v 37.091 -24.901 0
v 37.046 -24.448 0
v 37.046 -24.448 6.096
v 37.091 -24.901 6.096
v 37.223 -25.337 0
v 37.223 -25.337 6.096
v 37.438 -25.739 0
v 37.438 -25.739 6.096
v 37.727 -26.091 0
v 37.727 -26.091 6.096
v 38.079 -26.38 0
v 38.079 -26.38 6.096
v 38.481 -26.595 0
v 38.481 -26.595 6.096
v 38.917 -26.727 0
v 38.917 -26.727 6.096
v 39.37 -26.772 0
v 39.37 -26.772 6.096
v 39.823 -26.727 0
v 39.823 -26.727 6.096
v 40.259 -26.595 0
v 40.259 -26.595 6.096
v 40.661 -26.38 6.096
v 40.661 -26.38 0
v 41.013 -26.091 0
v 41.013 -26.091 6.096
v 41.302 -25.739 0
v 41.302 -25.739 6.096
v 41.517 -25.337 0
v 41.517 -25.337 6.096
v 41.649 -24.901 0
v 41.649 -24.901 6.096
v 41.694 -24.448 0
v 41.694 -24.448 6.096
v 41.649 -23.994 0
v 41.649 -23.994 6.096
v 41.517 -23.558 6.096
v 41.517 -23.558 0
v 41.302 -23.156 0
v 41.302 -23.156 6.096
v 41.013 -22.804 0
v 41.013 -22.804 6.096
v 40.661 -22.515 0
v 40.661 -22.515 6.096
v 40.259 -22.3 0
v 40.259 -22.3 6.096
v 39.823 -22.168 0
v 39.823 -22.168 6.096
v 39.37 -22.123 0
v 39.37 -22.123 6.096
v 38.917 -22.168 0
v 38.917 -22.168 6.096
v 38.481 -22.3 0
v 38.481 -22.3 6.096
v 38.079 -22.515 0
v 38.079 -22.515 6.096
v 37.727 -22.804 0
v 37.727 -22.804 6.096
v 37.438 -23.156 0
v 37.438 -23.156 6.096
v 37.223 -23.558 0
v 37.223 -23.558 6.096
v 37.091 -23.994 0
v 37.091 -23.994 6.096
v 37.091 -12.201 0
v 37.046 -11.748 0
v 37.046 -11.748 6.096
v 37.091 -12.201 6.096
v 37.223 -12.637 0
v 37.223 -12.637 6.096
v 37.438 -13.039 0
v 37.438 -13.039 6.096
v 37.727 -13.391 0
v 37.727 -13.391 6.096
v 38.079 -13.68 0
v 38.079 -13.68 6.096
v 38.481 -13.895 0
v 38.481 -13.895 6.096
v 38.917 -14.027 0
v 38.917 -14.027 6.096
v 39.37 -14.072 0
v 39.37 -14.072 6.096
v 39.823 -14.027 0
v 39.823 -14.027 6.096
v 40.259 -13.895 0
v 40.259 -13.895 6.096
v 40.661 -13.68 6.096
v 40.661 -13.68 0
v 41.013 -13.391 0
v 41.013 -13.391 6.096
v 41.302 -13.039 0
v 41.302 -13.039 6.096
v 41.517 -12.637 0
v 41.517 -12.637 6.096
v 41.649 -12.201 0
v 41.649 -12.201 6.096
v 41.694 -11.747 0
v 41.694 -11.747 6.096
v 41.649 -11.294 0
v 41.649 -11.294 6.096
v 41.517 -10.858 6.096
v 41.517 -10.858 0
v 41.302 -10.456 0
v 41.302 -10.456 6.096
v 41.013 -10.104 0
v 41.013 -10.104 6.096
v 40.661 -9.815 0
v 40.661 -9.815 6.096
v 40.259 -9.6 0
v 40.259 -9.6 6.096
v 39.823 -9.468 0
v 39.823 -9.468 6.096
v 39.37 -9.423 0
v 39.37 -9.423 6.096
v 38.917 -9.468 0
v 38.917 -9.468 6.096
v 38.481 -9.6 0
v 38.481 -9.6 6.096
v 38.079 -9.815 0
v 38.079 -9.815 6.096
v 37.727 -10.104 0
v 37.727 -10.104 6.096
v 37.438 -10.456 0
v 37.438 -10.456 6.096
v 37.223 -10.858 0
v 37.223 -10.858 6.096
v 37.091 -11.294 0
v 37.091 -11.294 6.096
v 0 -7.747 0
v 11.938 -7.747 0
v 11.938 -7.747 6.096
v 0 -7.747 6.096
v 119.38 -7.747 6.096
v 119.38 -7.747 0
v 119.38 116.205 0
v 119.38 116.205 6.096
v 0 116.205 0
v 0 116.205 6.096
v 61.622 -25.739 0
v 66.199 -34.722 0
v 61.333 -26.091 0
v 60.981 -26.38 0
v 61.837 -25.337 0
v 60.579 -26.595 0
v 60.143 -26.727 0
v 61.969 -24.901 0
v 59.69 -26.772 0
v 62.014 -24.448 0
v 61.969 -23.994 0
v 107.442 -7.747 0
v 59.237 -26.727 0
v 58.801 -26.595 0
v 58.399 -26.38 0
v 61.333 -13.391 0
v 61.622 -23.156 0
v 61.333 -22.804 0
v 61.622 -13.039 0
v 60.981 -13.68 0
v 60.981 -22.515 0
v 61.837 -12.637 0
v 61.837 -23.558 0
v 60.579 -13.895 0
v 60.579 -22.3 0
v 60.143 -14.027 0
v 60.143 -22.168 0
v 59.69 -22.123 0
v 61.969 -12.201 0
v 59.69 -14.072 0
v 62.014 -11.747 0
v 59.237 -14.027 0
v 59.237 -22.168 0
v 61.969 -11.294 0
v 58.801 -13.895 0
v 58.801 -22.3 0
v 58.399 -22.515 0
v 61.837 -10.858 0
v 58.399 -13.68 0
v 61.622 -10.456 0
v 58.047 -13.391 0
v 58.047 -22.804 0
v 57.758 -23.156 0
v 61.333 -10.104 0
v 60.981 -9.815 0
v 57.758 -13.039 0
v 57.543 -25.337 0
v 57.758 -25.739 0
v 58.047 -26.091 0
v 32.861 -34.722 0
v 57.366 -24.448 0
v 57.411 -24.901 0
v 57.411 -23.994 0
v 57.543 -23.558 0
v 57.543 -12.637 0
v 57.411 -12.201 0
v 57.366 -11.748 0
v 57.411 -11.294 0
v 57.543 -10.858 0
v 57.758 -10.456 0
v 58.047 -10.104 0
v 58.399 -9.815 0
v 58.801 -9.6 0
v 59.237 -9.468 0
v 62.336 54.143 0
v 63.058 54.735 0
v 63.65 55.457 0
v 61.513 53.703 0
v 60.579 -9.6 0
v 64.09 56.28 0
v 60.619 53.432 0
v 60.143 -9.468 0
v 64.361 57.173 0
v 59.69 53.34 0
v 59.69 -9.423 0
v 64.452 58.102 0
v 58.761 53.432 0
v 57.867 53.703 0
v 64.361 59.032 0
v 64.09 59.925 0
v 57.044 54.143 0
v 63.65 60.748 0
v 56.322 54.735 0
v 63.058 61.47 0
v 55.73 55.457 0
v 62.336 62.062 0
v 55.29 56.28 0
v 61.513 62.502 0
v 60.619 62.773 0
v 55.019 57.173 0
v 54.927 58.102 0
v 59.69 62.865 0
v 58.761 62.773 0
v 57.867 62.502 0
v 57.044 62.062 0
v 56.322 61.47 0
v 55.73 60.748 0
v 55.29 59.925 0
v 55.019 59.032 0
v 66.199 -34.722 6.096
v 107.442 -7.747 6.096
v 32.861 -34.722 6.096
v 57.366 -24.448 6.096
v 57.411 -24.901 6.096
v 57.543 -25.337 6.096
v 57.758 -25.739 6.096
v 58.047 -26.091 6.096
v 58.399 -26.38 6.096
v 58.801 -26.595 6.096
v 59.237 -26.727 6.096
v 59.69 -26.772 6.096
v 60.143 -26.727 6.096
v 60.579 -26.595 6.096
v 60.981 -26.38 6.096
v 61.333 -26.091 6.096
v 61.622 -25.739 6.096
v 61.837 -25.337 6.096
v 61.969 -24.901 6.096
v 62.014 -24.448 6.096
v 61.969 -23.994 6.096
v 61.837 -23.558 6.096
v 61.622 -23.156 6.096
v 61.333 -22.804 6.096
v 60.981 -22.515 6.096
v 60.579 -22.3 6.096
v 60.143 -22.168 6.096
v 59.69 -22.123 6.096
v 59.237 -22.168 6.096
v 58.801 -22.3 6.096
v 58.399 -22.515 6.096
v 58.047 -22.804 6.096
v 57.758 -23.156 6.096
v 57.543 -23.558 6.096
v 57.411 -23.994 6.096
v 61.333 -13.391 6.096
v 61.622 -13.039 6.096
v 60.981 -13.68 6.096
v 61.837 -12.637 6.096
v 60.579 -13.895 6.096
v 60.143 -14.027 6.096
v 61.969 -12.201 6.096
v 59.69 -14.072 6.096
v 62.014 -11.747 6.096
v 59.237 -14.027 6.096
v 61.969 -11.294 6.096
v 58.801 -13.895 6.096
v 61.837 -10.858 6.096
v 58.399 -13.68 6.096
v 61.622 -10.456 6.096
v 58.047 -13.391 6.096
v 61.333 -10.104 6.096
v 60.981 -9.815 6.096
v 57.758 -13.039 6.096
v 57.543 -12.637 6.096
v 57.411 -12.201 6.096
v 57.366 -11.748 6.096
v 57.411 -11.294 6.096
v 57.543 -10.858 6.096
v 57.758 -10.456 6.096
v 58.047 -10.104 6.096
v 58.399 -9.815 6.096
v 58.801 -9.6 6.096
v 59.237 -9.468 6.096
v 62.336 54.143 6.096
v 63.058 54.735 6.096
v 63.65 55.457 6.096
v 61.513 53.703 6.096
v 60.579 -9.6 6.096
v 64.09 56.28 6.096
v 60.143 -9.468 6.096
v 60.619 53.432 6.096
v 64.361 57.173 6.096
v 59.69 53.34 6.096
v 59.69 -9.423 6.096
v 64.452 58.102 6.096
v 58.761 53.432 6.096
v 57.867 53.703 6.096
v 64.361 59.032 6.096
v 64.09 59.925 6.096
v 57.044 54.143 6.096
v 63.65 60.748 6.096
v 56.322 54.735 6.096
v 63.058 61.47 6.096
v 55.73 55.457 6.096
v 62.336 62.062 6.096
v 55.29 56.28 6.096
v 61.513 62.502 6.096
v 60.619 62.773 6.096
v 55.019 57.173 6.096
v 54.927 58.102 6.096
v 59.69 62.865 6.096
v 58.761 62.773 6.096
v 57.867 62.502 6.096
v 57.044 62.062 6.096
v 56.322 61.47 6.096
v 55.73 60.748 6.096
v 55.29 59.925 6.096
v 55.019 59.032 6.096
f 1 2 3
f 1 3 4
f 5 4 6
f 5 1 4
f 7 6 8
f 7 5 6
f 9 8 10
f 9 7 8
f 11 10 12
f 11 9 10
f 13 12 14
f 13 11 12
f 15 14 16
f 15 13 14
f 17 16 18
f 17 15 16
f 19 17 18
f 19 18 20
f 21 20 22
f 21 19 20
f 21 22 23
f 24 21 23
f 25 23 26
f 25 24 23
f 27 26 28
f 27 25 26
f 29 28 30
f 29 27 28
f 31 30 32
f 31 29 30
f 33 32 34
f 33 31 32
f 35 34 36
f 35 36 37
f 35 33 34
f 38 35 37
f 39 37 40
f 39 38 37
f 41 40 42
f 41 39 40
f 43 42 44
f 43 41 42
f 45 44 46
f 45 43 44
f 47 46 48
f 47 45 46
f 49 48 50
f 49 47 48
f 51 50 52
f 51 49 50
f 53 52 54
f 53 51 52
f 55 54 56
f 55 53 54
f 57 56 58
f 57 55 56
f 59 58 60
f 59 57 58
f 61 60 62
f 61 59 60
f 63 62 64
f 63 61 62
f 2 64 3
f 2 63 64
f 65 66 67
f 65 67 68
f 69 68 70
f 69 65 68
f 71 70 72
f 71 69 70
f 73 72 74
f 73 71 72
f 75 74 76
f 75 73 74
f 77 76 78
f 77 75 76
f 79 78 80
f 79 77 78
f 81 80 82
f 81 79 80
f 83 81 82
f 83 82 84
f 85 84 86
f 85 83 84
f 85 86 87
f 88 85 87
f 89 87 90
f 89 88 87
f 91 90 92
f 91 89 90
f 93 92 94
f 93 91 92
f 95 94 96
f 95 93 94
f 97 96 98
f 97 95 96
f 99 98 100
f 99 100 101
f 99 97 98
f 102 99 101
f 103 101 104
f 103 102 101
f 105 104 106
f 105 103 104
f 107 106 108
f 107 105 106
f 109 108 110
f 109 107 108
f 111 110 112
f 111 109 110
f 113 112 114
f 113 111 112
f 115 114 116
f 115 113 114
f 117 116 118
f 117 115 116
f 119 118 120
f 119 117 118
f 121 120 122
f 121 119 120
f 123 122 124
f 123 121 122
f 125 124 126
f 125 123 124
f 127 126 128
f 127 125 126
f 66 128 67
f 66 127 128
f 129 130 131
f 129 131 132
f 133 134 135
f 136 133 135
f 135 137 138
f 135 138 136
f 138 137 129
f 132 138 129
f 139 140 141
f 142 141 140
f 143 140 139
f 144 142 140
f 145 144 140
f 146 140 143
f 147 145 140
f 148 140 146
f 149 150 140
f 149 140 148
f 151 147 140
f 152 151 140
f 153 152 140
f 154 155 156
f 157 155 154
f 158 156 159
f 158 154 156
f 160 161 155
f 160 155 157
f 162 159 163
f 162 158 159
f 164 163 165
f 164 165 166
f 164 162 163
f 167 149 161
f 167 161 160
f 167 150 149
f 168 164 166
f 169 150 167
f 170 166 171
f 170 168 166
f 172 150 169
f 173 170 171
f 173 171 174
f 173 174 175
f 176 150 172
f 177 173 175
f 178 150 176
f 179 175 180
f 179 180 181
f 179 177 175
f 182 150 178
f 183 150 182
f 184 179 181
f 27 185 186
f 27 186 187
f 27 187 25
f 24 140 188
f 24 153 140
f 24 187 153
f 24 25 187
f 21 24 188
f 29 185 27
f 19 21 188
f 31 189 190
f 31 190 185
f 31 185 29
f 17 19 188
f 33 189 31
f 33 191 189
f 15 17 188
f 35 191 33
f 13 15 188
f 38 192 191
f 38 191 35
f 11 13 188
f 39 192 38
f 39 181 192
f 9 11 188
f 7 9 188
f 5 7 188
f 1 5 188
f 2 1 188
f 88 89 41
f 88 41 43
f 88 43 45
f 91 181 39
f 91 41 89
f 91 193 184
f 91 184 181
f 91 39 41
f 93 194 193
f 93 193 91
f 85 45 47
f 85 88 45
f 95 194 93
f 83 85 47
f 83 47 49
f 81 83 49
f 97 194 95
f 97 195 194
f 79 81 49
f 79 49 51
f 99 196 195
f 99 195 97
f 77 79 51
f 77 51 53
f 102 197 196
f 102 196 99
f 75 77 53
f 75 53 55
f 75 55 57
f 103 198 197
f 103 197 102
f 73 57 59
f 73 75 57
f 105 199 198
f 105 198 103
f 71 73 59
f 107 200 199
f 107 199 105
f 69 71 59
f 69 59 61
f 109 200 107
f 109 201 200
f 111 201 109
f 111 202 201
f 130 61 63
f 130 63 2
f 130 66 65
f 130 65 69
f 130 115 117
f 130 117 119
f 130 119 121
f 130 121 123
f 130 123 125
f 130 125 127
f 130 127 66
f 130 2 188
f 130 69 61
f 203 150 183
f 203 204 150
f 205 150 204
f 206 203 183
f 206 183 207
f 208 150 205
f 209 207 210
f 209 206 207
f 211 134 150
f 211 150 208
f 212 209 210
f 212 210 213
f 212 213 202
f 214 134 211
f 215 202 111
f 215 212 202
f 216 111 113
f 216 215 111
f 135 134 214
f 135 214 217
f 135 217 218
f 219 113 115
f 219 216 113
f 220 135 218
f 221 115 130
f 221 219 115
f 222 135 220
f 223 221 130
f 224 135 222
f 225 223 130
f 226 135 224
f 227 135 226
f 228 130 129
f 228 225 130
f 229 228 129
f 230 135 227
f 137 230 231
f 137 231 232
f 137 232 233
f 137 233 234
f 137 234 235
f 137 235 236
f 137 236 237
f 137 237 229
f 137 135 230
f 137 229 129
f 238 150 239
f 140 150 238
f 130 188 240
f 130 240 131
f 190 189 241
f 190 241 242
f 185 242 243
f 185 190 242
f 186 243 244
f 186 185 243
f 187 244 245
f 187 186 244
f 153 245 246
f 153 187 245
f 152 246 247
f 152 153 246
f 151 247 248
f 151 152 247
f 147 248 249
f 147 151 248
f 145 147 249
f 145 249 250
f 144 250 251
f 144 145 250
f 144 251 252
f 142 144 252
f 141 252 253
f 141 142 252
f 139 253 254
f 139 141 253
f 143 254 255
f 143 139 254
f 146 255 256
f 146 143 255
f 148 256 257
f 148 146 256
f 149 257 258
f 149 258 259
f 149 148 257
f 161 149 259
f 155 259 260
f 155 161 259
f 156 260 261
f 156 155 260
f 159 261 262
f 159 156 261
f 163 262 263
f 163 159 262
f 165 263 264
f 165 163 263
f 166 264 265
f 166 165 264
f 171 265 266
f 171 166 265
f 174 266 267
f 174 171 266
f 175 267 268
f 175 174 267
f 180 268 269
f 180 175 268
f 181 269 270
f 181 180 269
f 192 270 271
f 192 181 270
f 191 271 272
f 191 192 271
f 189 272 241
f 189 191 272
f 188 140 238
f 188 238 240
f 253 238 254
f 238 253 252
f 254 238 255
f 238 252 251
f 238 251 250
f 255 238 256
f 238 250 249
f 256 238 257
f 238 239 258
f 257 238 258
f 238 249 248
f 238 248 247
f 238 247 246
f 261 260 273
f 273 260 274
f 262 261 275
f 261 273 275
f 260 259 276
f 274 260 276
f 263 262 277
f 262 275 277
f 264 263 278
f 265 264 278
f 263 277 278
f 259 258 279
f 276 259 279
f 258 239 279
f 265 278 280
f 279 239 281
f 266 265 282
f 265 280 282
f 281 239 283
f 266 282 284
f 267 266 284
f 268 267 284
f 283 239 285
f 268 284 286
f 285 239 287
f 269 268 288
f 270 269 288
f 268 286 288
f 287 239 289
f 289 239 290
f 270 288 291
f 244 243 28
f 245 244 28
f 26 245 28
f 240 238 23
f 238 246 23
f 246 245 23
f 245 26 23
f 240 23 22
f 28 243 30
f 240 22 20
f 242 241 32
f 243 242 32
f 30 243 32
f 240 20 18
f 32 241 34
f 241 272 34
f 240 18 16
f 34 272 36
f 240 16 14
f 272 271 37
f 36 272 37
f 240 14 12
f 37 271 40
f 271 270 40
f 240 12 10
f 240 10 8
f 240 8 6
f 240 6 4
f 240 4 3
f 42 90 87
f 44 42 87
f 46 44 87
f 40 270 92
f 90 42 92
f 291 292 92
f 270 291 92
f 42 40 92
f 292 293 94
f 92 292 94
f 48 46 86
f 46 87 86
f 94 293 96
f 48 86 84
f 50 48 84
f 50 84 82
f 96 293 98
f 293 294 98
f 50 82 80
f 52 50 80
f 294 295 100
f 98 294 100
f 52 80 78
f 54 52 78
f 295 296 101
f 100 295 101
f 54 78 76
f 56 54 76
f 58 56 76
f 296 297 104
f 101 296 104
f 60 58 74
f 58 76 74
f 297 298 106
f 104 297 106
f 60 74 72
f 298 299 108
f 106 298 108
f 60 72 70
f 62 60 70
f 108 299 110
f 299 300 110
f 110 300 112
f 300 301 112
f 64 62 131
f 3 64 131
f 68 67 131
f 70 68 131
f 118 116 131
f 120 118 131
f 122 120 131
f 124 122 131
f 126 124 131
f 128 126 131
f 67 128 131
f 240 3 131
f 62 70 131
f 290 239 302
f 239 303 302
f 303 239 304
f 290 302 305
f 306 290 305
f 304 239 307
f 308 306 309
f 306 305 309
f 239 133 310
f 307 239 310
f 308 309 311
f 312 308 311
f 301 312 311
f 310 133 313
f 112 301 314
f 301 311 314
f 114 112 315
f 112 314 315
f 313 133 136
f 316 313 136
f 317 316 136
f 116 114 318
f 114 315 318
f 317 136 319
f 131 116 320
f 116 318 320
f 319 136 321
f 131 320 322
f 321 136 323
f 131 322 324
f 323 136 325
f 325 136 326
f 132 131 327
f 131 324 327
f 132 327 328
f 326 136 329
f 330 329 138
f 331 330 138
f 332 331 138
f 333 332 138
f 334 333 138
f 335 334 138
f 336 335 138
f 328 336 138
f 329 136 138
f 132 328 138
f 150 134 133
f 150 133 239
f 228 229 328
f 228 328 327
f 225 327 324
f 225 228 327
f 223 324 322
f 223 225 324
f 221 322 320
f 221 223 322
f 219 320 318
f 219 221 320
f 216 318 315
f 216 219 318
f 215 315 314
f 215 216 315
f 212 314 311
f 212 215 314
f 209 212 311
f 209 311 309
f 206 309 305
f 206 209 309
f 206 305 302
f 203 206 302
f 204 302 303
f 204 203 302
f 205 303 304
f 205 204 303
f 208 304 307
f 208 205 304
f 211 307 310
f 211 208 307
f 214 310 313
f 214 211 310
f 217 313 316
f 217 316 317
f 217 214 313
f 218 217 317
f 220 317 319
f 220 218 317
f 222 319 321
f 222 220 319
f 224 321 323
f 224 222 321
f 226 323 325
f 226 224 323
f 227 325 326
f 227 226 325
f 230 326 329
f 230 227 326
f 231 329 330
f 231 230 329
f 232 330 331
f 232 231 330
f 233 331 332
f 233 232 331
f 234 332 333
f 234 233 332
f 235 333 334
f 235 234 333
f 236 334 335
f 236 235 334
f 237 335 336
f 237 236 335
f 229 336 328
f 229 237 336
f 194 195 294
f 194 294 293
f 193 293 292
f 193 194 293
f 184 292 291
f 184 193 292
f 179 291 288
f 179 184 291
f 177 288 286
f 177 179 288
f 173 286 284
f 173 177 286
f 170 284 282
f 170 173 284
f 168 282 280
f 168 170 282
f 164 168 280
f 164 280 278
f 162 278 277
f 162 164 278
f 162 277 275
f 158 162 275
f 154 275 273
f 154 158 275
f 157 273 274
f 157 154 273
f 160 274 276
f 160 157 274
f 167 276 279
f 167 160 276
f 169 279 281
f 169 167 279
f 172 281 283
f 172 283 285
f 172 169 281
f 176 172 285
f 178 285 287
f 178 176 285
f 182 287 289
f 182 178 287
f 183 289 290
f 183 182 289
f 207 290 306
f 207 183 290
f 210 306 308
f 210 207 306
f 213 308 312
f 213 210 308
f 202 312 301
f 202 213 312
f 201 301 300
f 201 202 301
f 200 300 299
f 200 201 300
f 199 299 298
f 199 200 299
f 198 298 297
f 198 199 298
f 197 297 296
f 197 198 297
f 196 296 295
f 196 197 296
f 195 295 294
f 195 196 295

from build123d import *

# Parameters (mm, degrees)
SKETCH1_R           = 4.7625
SKETCH1_R_2         = 2.3241
BOSS_EXTRUDE1_DEPTH = 6.096


with BuildPart() as part:
    # Sketch1 → Boss-Extrude1 (new body)
    with BuildSketch(Plane.XY):
        Polygon((0, 0), (0, 116.205), (119.38, 116.205), (119.38, 0), (119.38, -7.747), (107.442, -7.747), (66.19875, -34.7218), (32.86125, -34.7218), (11.938, -7.747), (0, -7.747), align=None)
        with Locations(Location((59.69, 58.1025, 0), (0, 0, 180))):
            Circle(SKETCH1_R, mode=Mode.SUBTRACT)
        with Locations(Location((39.37, -11.7475, 0), (0, 0, 180))):
            Circle(SKETCH1_R_2, mode=Mode.SUBTRACT)
        with Locations(Location((59.69, -11.7475, 0), (0, 0, 180))):
            Circle(SKETCH1_R_2, mode=Mode.SUBTRACT)
        with Locations(Location((59.69, -24.4475, 0), (0, 0, 180))):
            Circle(SKETCH1_R_2, mode=Mode.SUBTRACT)
        with Locations(Location((39.37, -24.4475, 0), (0, 0, 180))):
            Circle(SKETCH1_R_2, mode=Mode.SUBTRACT)
    extrude(amount=BOSS_EXTRUDE1_DEPTH)


solid = part.part
